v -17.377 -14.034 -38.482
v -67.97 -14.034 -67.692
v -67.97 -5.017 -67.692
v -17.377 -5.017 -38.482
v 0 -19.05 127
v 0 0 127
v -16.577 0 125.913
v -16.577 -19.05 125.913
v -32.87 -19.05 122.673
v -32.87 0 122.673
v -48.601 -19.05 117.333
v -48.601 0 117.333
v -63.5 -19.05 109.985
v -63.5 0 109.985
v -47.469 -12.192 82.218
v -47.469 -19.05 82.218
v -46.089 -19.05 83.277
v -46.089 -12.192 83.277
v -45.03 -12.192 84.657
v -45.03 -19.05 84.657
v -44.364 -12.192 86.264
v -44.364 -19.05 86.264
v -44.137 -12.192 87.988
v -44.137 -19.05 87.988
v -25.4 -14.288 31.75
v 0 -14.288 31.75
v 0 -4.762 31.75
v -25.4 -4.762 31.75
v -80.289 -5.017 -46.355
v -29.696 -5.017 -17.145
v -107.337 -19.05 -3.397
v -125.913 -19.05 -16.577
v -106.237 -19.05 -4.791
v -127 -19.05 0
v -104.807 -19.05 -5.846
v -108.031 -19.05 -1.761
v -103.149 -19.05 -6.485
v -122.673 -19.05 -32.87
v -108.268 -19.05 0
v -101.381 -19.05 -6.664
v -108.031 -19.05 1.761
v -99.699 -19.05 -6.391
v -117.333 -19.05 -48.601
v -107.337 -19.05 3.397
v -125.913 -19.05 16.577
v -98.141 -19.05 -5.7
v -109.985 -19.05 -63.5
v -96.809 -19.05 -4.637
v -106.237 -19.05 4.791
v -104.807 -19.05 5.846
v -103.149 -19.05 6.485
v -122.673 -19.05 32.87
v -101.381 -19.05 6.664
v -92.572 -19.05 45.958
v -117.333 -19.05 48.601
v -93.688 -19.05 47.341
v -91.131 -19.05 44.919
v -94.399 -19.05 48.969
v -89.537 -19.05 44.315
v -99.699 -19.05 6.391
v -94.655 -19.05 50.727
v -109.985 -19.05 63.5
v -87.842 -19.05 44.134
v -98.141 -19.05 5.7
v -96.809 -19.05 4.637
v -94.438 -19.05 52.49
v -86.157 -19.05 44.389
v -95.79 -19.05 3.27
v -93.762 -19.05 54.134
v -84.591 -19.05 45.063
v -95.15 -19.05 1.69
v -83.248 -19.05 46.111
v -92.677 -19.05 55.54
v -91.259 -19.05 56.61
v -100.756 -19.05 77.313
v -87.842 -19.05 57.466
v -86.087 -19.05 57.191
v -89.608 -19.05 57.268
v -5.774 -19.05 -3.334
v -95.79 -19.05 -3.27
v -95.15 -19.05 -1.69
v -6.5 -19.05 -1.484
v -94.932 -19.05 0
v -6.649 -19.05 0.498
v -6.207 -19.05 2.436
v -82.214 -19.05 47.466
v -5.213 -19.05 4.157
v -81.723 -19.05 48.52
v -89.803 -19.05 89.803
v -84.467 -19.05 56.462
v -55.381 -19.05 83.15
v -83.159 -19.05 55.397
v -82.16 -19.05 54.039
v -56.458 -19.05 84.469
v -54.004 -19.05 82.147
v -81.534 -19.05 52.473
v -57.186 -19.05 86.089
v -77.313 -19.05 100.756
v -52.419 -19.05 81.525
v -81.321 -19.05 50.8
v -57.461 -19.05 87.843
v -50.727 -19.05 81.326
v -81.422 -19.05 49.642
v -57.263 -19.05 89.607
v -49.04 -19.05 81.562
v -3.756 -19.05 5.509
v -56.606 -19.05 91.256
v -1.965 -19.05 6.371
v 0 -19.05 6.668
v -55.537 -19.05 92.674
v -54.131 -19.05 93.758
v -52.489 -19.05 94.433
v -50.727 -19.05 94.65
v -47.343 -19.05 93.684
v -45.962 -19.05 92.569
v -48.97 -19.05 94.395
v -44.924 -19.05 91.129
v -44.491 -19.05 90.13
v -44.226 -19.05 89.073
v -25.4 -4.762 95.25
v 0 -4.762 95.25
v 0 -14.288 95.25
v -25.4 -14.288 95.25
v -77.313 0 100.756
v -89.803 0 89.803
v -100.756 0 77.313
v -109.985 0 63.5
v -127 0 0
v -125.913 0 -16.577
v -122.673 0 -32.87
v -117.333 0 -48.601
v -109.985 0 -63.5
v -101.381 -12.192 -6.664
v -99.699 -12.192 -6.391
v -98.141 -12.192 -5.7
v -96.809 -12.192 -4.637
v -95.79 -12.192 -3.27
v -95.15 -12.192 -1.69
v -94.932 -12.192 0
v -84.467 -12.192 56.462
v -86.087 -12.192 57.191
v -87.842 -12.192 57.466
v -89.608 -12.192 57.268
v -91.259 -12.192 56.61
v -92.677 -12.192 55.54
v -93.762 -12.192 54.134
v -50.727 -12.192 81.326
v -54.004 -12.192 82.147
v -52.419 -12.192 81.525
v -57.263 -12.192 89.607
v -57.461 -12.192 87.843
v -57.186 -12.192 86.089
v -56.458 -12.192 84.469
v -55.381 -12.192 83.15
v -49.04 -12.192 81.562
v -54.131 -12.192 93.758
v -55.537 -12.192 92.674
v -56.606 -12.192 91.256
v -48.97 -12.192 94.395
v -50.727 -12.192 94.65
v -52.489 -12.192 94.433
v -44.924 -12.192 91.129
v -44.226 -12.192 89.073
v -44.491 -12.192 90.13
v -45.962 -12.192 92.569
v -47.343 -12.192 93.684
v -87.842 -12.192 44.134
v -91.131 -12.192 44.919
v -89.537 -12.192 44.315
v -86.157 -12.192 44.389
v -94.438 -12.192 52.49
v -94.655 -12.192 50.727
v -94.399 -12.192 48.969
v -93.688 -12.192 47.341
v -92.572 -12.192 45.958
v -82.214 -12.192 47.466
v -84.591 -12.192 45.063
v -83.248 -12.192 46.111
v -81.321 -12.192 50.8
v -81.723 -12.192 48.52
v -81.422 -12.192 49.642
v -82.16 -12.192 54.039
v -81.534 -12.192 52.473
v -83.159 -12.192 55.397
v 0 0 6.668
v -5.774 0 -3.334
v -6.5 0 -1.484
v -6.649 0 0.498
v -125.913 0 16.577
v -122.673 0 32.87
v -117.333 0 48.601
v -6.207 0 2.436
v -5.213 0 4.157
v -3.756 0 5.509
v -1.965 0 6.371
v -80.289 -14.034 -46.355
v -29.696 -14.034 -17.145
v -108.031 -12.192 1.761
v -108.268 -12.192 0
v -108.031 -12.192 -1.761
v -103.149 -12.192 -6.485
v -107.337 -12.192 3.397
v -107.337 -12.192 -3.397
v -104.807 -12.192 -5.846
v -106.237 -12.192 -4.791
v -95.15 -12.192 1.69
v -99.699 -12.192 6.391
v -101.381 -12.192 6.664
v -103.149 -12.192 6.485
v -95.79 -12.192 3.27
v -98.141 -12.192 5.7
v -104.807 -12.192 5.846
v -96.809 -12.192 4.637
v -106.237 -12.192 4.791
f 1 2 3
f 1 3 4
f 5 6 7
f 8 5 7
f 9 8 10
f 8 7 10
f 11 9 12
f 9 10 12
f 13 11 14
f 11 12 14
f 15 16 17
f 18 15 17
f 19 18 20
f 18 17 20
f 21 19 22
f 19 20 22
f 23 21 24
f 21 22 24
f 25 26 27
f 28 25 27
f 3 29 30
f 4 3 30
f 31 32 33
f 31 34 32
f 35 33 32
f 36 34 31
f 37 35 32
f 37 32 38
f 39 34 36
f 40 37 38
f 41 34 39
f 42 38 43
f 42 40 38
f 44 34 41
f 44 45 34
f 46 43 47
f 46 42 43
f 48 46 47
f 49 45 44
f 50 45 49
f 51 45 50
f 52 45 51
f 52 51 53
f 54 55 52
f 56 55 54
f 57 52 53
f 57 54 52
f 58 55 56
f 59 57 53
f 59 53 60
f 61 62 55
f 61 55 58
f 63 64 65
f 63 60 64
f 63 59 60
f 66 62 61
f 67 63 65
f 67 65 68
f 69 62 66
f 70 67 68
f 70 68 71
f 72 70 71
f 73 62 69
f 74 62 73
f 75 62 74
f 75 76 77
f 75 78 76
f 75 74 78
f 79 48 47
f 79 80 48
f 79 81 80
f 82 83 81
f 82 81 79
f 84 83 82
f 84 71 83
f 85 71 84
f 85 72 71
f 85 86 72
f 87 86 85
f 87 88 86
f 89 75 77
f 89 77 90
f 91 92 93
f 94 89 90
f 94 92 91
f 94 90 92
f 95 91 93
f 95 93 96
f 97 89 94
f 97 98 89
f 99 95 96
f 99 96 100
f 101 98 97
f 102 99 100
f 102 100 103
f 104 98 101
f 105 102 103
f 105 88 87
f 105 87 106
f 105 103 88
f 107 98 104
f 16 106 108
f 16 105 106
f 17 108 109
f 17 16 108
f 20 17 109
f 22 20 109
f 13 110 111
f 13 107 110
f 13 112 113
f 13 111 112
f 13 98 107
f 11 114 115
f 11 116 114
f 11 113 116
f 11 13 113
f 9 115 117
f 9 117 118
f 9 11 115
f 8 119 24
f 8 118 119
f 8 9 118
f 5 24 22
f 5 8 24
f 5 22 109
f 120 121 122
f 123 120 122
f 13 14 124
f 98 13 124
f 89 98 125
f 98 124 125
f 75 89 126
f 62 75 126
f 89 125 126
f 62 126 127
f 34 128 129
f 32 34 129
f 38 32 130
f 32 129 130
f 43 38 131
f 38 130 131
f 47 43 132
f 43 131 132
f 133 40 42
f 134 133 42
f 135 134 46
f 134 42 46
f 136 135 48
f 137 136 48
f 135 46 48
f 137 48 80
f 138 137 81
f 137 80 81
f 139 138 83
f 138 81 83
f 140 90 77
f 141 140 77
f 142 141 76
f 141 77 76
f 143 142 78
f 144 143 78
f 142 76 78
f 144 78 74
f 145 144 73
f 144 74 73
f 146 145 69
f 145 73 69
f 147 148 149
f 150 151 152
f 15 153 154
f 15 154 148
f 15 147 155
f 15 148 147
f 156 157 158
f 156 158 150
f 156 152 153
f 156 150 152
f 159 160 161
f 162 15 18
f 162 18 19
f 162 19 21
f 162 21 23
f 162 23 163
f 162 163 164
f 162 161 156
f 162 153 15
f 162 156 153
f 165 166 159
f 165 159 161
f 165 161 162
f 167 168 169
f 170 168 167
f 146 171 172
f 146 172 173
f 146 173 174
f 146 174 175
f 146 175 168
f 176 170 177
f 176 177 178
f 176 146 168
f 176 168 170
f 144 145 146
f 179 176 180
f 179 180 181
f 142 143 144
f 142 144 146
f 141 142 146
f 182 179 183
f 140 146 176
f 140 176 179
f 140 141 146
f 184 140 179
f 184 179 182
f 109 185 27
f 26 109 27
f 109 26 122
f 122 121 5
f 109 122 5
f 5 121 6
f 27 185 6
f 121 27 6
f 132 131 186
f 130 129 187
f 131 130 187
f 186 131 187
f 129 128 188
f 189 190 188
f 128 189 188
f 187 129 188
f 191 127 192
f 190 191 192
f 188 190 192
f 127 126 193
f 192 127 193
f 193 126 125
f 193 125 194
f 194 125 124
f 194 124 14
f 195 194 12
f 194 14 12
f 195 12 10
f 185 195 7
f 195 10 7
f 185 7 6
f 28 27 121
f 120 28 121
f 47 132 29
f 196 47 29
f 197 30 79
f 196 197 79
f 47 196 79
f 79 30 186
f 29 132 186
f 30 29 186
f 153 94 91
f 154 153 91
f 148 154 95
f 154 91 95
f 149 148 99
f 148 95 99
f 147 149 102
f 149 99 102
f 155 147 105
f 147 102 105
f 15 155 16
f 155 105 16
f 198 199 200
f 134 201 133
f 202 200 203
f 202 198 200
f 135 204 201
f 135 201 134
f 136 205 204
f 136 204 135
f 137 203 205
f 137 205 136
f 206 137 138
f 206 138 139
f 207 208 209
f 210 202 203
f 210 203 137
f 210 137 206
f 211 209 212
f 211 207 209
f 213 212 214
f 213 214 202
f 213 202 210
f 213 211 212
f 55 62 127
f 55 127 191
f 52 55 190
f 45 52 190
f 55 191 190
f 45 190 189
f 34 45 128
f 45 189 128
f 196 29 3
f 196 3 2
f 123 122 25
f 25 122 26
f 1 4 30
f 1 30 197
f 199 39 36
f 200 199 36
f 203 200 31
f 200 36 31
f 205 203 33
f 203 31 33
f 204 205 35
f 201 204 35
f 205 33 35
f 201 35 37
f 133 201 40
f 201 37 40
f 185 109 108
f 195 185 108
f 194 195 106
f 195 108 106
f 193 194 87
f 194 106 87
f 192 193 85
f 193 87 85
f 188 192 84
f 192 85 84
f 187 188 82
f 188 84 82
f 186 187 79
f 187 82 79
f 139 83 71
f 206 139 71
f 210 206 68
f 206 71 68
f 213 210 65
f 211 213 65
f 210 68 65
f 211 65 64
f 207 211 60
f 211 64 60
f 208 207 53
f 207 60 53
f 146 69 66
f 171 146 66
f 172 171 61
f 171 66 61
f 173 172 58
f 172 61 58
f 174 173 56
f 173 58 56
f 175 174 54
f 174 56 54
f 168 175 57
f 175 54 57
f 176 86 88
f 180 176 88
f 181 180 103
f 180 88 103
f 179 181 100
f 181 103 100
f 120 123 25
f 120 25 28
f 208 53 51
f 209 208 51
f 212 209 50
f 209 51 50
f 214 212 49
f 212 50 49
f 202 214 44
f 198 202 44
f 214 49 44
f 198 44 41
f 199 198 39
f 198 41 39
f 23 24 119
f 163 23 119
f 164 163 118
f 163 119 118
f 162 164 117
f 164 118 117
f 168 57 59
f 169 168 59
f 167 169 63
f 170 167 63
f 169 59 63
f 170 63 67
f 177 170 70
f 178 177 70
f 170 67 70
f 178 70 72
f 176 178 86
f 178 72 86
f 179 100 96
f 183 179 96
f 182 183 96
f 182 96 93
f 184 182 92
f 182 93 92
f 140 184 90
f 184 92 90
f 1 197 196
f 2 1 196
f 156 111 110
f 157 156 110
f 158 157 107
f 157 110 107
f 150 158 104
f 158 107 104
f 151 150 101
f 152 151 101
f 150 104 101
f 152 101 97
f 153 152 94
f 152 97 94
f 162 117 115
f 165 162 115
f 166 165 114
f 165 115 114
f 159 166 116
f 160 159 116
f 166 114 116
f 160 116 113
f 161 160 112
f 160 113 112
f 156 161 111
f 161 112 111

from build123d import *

# Parameters (mm, degrees)
F1_DEPTH = 19.05
F2_W     = 4.7625
F2_H     = 31.75
F3_DEPTH = 25.4
F4_W     = 29.21
F4_H     = 9.017
F5_DEPTH = 24.638
F7_DEPTH = 6.858
F8_R     = 6.6675
F9_DEPTH = 25.4


with BuildPart() as f1:
    # F0 (on Front) → F1 (new body)
    with BuildSketch(Plane.XZ):
        with BuildLine():
            Line((0, 101.6), (0, 127))
            ThreePointArc((0, 127), (-32.870018728, 122.6725799387), (-63.5, 109.9852262806))
            Line((-63.5, 109.9852262806), (-54.102, 93.7074127911))
            ThreePointArc((-54.102, 93.7074127911), (-48.9873127514, 94.3385338445), (-44.9764745007, 91.1025616626))
            ThreePointArc((-44.9764745007, 91.1025616626), (-23.092636652, 98.9408415795), (0, 101.6))
        make_face()
        with BuildLine():
            Line((-108.204, 0), (-127, 0))
            ThreePointArc((-127, 0), (-122.6725799387, -32.870018728), (-109.9852262806, -63.5))
            Line((-109.9852262806, -63.5), (-87.9881810245, -50.8))
            ThreePointArc((-87.9881810245, -50.8), (-97.2316006056, -29.4716108088), (-101.38537, -6.600511341))
            ThreePointArc((-101.38537, -6.600511341), (-106.1932232408, -4.7450096164), (-108.204, 0))
        make_face()
        with BuildLine():
            Line((0, 0), (0, 101.6))
            ThreePointArc((0, 101.6), (-23.092636652, 98.9408415795), (-44.9764745007, 91.1025616626))
            ThreePointArc((-44.9764745007, 91.1025616626), (-44.3940895106, 89.5935242281), (-44.196, 87.9881810245))
            ThreePointArc((-44.196, 87.9881810245), (-45.0807682334, 84.6861810245), (-47.498, 82.2689492579))
            Line((-47.498, 82.2689492579), (0, 0))
        make_face()
        with BuildLine():
            Line((-87.9881810245, -50.8), (0, 0))
            Line((0, 0), (-94.996, 0))
            ThreePointArc((-94.996, 0), (-96.8549903836, -4.5932232408), (-101.38537, -6.600511341))
            ThreePointArc((-101.38537, -6.600511341), (-97.2316006056, -29.4716108088), (-87.9881810245, -50.8))
        make_face()
        with BuildLine():
            Line((-54.102, 93.7074127911), (-63.5, 109.9852262806))
            ThreePointArc((-63.5, 109.9852262806), (-89.8025612107, 89.8025612107), (-109.9852262806, 63.5))
            Line((-109.9852262806, 63.5), (-93.7074127911, 54.102))
            ThreePointArc((-93.7074127911, 54.102), (-89.5935242281, 57.2059104894), (-84.5020503216, 56.4088954993))
            ThreePointArc((-84.5020503216, 56.4088954993), (-71.8420489686, 71.8420489686), (-56.4088954993, 84.5020503216))
            ThreePointArc((-56.4088954993, 84.5020503216), (-57.2059104894, 89.5935242281), (-54.102, 93.7074127911))
        make_face()
        with BuildLine():
            Line((-93.7074127911, 54.102), (-109.9852262806, 63.5))
            ThreePointArc((-109.9852262806, 63.5), (-122.6725799387, 32.870018728), (-127, 0))
            Line((-127, 0), (-108.204, 0))
            ThreePointArc((-108.204, 0), (-106.1932232408, 4.7450096164), (-101.38537, 6.600511341))
            ThreePointArc((-101.38537, 6.600511341), (-98.138063951, 26.2960149824), (-91.1025616626, 44.9764745007))
            ThreePointArc((-91.1025616626, 44.9764745007), (-94.3385338445, 48.9873127514), (-93.7074127911, 54.102))
        make_face()
        with BuildLine():
            Line((-82.2689492579, 47.498), (0, 0))
            Line((0, 0), (-47.498, 82.2689492579))
            ThreePointArc((-47.498, 82.2689492579), (-52.4053432036, 81.5822705351), (-56.4088954993, 84.5020503216))
            ThreePointArc((-56.4088954993, 84.5020503216), (-71.8420489686, 71.8420489686), (-84.5020503216, 56.4088954993))
            ThreePointArc((-84.5020503216, 56.4088954993), (-82.2160400369, 54.0086140963), (-81.3841810245, 50.8))
            ThreePointArc((-81.3841810245, 50.8), (-81.6092068677, 49.0907590261), (-82.2689492579, 47.498))
        make_face()
        with BuildLine():
            Line((-94.996, 0), (0, 0))
            Line((0, 0), (-82.2689492579, 47.498))
            ThreePointArc((-82.2689492579, 47.498), (-86.1754937759, 44.44964718), (-91.1025616626, 44.9764745007))
            ThreePointArc((-91.1025616626, 44.9764745007), (-98.138063951, 26.2960149824), (-101.38537, 6.600511341))
            ThreePointArc((-101.38537, 6.600511341), (-96.8549903836, 4.5932232408), (-94.996, 0))
        make_face()
        with BuildLine():
            Line((-101.6, 0), (-108.204, 0))
            ThreePointArc((-108.204, 0), (-106.1932232408, -4.7450096164), (-101.38537, -6.600511341))
            ThreePointArc((-101.38537, -6.600511341), (-101.5463283236, -3.302), (-101.6, 0))
        make_face()
        with BuildLine():
            ThreePointArc((-101.38537, -6.600511341), (-96.8549903836, -4.5932232408), (-94.996, 0))
            Line((-94.996, 0), (-101.6, 0))
            ThreePointArc((-101.6, 0), (-101.5463283236, -3.302), (-101.38537, -6.600511341))
        make_face()
        with BuildLine():
            ThreePointArc((-101.38537, 6.600511341), (-106.1932232408, 4.7450096164), (-108.204, 0))
            Line((-108.204, 0), (-101.6, 0))
            ThreePointArc((-101.6, 0), (-101.5463283236, 3.302), (-101.38537, 6.600511341))
        make_face()
        with BuildLine():
            Line((-101.6, 0), (-94.996, 0))
            ThreePointArc((-94.996, 0), (-96.8549903836, 4.5932232408), (-101.38537, 6.600511341))
            ThreePointArc((-101.38537, 6.600511341), (-101.5463283236, 3.302), (-101.6, 0))
        make_face()
        with BuildLine():
            ThreePointArc((-91.1025616626, 44.9764745007), (-86.1754937759, 44.44964718), (-82.2689492579, 47.498))
            Line((-82.2689492579, 47.498), (-87.9881810245, 50.8))
            ThreePointArc((-87.9881810245, 50.8), (-89.5926999893, 47.9135482785), (-91.1025616626, 44.9764745007))
        make_face()
        with BuildLine():
            Line((-87.9881810245, 50.8), (-93.7074127911, 54.102))
            ThreePointArc((-93.7074127911, 54.102), (-94.3385338445, 48.9873127514), (-91.1025616626, 44.9764745007))
            ThreePointArc((-91.1025616626, 44.9764745007), (-89.5926999893, 47.9135482785), (-87.9881810245, 50.8))
        make_face()
        with BuildLine():
            ThreePointArc((-84.5020503216, 56.4088954993), (-89.5935242281, 57.2059104894), (-93.7074127911, 54.102))
            Line((-93.7074127911, 54.102), (-87.9881810245, 50.8))
            ThreePointArc((-87.9881810245, 50.8), (-86.2906999893, 53.6327800451), (-84.5020503216, 56.4088954993))
        make_face()
        with BuildLine():
            Line((-87.9881810245, 50.8), (-82.2689492579, 47.498))
            ThreePointArc((-82.2689492579, 47.498), (-81.6092068677, 49.0907590261), (-81.3841810245, 50.8))
            ThreePointArc((-81.3841810245, 50.8), (-82.2160400369, 54.0086140963), (-84.5020503216, 56.4088954993))
            ThreePointArc((-84.5020503216, 56.4088954993), (-86.2906999893, 53.6327800451), (-87.9881810245, 50.8))
        make_face()
        with BuildLine():
            Line((-47.498, 82.2689492579), (-50.8, 87.9881810245))
            ThreePointArc((-50.8, 87.9881810245), (-53.6327800451, 86.2906999893), (-56.4088954993, 84.5020503216))
            ThreePointArc((-56.4088954993, 84.5020503216), (-52.4053432036, 81.5822705351), (-47.498, 82.2689492579))
        make_face()
        with BuildLine():
            ThreePointArc((-44.196, 87.9881810245), (-44.3940895106, 89.5935242281), (-44.9764745007, 91.1025616626))
            ThreePointArc((-44.9764745007, 91.1025616626), (-47.9135482785, 89.5926999893), (-50.8, 87.9881810245))
            Line((-50.8, 87.9881810245), (-47.498, 82.2689492579))
            ThreePointArc((-47.498, 82.2689492579), (-45.0807682334, 84.6861810245), (-44.196, 87.9881810245))
        make_face()
        with BuildLine():
            ThreePointArc((-44.9764745007, 91.1025616626), (-48.9873127514, 94.3385338445), (-54.102, 93.7074127911))
            Line((-54.102, 93.7074127911), (-50.8, 87.9881810245))
            ThreePointArc((-50.8, 87.9881810245), (-47.9135482785, 89.5926999893), (-44.9764745007, 91.1025616626))
        make_face()
        with BuildLine():
            Line((-50.8, 87.9881810245), (-54.102, 93.7074127911))
            ThreePointArc((-54.102, 93.7074127911), (-57.2059104894, 89.5935242281), (-56.4088954993, 84.5020503216))
            ThreePointArc((-56.4088954993, 84.5020503216), (-53.6327800451, 86.2906999893), (-50.8, 87.9881810245))
        make_face()
    extrude(amount=F1_DEPTH)

    # F2 (on face) → F3 (cut)
    with BuildSketch(Plane.YZ):
        with Locations((-7.14375, 47.625)):
            Rectangle(F2_W, F2_H)
        with Locations((-11.90625, 47.625)):
            Rectangle(F2_W, F2_H)
        with Locations((-11.90625, 79.375)):
            Rectangle(F2_W, F2_H)
        with Locations((-7.14375, 79.375)):
            Rectangle(F2_W, F2_H)
    extrude(amount=-F3_DEPTH, mode=Mode.SUBTRACT)

    # F4 (on face) → F5 (join)
    with BuildSketch(Plane(origin=(0, 0, 0), x_dir=(0.8660254038, 0, 0.5), z_dir=(0.5, 0, -0.8660254038))):
        with Locations((-78.105, 9.525)):
            Rectangle(F4_W, F4_H)
        with Locations((-48.895, 9.525)):
            Rectangle(F4_W, F4_H)
    extrude(amount=F5_DEPTH)

    # F6 (on face) → F7 (cut)
    with BuildSketch(Plane.XZ.offset(19.05)):
        with BuildLine():
            ThreePointArc((-101.3812226563, -6.6639097176), (-96.808640371, -4.6366398561), (-94.9325, 0))
            Line((-94.9325, 0), (-101.6, 0))
            ThreePointArc((-101.6, 0), (-101.5452909343, -3.33375), (-101.3812226563, -6.6639097176))
        make_face()
        with BuildLine():
            ThreePointArc((-101.3812226563, -6.6639097176), (-101.5452909343, -3.33375), (-101.6, 0))
            Line((-101.6, 0), (-108.2675, 0))
            ThreePointArc((-108.2675, 0), (-106.2366398561, -4.791359629), (-101.3812226563, -6.6639097176))
        make_face()
        with BuildLine():
            Line((-108.2675, 0), (-101.6, 0))
            ThreePointArc((-101.6, 0), (-101.5452909343, 3.33375), (-101.3812226563, 6.6639097176))
            ThreePointArc((-101.3812226563, 6.6639097176), (-106.2366398561, 4.791359629), (-108.2675, 0))
        make_face()
        with BuildLine():
            Line((-101.6, 0), (-94.9325, 0))
            ThreePointArc((-94.9325, 0), (-96.808640371, 4.6366398561), (-101.3812226563, 6.6639097176))
            ThreePointArc((-101.3812226563, 6.6639097176), (-101.5452909343, 3.33375), (-101.6, 0))
        make_face()
        with BuildLine():
            ThreePointArc((-91.1306691458, 44.9194962242), (-86.1570617951, 44.3888722819), (-82.2139566448, 47.46625))
            Line((-82.2139566448, 47.46625), (-87.9881810245, 50.8))
            ThreePointArc((-87.9881810245, 50.8), (-89.6076765838, 47.8855332773), (-91.1306691458, 44.9194962242))
        make_face()
        with BuildLine():
            ThreePointArc((-91.1306691458, 44.9194962242), (-89.6076765838, 47.8855332773), (-87.9881810245, 50.8))
            Line((-87.9881810245, 50.8), (-93.7624054042, 54.13375))
            ThreePointArc((-93.7624054042, 54.13375), (-94.3993087426, 48.9688807706), (-91.1306691458, 44.9194962242))
        make_face()
        with BuildLine():
            Line((-93.7624054042, 54.13375), (-87.9881810245, 50.8))
            ThreePointArc((-87.9881810245, 50.8), (-86.2739265838, 53.659757657), (-84.4667594283, 56.4617264321))
            ThreePointArc((-84.4667594283, 56.4617264321), (-89.6079491136, 57.2677590855), (-93.7624054042, 54.13375))
        make_face()
        with BuildLine():
            Line((-87.9881810245, 50.8), (-82.2139566448, 47.46625))
            ThreePointArc((-82.2139566448, 47.46625), (-81.5478705777, 49.0743240168), (-81.3206810245, 50.8))
            ThreePointArc((-81.3206810245, 50.8), (-82.1600323157, 54.0385550603), (-84.4667594283, 56.4617264321))
            ThreePointArc((-84.4667594283, 56.4617264321), (-86.2739265838, 53.659757657), (-87.9881810245, 50.8))
        make_face()
        with BuildLine():
            ThreePointArc((-56.4577228186, 84.4694355027), (-52.4186754183, 81.525109972), (-47.4686565195, 82.2181248589))
            Line((-47.4686565195, 82.2181248589), (-50.8, 87.9881810245))
            ThreePointArc((-50.8, 87.9881810245), (-53.6577130389, 86.2751982405), (-56.4577228186, 84.4694355027))
        make_face()
        with BuildLine():
            Line((-54.1313434805, 93.7582371901), (-50.8, 87.9881810245))
            ThreePointArc((-50.8, 87.9881810245), (-47.8876568733, 89.6065417209), (-44.9238155794, 91.128539952))
            ThreePointArc((-44.9238155794, 91.128539952), (-48.9702785065, 94.3947024516), (-54.1313434805, 93.7582371901))
        make_face()
        with BuildLine():
            ThreePointArc((-56.4577228186, 84.4694355027), (-53.6577130389, 86.2751982405), (-50.8, 87.9881810245))
            Line((-50.8, 87.9881810245), (-54.1313434805, 93.7582371901))
            ThreePointArc((-54.1313434805, 93.7582371901), (-57.2630710525, 89.6068564428), (-56.4577228186, 84.4694355027))
        make_face()
        with BuildLine():
            Line((-50.8, 87.9881810245), (-47.4686565195, 82.2181248589))
            ThreePointArc((-47.4686565195, 82.2181248589), (-45.0299438344, 84.656837544), (-44.1373130391, 87.9881810245))
            ThreePointArc((-44.1373130391, 87.9881810245), (-44.3369289475, 89.6068564428), (-44.9238155794, 91.128539952))
            ThreePointArc((-44.9238155794, 91.128539952), (-47.8876568733, 89.6065417209), (-50.8, 87.9881810245))
        make_face()
    extrude(amount=-F7_DEPTH, mode=Mode.SUBTRACT)

    # F8 (on face) → F9 (cut)
    with BuildSketch(Plane.XZ.offset(19.05)):
        Circle(F8_R)
    extrude(amount=-F9_DEPTH, mode=Mode.SUBTRACT)


solid = f1.part
